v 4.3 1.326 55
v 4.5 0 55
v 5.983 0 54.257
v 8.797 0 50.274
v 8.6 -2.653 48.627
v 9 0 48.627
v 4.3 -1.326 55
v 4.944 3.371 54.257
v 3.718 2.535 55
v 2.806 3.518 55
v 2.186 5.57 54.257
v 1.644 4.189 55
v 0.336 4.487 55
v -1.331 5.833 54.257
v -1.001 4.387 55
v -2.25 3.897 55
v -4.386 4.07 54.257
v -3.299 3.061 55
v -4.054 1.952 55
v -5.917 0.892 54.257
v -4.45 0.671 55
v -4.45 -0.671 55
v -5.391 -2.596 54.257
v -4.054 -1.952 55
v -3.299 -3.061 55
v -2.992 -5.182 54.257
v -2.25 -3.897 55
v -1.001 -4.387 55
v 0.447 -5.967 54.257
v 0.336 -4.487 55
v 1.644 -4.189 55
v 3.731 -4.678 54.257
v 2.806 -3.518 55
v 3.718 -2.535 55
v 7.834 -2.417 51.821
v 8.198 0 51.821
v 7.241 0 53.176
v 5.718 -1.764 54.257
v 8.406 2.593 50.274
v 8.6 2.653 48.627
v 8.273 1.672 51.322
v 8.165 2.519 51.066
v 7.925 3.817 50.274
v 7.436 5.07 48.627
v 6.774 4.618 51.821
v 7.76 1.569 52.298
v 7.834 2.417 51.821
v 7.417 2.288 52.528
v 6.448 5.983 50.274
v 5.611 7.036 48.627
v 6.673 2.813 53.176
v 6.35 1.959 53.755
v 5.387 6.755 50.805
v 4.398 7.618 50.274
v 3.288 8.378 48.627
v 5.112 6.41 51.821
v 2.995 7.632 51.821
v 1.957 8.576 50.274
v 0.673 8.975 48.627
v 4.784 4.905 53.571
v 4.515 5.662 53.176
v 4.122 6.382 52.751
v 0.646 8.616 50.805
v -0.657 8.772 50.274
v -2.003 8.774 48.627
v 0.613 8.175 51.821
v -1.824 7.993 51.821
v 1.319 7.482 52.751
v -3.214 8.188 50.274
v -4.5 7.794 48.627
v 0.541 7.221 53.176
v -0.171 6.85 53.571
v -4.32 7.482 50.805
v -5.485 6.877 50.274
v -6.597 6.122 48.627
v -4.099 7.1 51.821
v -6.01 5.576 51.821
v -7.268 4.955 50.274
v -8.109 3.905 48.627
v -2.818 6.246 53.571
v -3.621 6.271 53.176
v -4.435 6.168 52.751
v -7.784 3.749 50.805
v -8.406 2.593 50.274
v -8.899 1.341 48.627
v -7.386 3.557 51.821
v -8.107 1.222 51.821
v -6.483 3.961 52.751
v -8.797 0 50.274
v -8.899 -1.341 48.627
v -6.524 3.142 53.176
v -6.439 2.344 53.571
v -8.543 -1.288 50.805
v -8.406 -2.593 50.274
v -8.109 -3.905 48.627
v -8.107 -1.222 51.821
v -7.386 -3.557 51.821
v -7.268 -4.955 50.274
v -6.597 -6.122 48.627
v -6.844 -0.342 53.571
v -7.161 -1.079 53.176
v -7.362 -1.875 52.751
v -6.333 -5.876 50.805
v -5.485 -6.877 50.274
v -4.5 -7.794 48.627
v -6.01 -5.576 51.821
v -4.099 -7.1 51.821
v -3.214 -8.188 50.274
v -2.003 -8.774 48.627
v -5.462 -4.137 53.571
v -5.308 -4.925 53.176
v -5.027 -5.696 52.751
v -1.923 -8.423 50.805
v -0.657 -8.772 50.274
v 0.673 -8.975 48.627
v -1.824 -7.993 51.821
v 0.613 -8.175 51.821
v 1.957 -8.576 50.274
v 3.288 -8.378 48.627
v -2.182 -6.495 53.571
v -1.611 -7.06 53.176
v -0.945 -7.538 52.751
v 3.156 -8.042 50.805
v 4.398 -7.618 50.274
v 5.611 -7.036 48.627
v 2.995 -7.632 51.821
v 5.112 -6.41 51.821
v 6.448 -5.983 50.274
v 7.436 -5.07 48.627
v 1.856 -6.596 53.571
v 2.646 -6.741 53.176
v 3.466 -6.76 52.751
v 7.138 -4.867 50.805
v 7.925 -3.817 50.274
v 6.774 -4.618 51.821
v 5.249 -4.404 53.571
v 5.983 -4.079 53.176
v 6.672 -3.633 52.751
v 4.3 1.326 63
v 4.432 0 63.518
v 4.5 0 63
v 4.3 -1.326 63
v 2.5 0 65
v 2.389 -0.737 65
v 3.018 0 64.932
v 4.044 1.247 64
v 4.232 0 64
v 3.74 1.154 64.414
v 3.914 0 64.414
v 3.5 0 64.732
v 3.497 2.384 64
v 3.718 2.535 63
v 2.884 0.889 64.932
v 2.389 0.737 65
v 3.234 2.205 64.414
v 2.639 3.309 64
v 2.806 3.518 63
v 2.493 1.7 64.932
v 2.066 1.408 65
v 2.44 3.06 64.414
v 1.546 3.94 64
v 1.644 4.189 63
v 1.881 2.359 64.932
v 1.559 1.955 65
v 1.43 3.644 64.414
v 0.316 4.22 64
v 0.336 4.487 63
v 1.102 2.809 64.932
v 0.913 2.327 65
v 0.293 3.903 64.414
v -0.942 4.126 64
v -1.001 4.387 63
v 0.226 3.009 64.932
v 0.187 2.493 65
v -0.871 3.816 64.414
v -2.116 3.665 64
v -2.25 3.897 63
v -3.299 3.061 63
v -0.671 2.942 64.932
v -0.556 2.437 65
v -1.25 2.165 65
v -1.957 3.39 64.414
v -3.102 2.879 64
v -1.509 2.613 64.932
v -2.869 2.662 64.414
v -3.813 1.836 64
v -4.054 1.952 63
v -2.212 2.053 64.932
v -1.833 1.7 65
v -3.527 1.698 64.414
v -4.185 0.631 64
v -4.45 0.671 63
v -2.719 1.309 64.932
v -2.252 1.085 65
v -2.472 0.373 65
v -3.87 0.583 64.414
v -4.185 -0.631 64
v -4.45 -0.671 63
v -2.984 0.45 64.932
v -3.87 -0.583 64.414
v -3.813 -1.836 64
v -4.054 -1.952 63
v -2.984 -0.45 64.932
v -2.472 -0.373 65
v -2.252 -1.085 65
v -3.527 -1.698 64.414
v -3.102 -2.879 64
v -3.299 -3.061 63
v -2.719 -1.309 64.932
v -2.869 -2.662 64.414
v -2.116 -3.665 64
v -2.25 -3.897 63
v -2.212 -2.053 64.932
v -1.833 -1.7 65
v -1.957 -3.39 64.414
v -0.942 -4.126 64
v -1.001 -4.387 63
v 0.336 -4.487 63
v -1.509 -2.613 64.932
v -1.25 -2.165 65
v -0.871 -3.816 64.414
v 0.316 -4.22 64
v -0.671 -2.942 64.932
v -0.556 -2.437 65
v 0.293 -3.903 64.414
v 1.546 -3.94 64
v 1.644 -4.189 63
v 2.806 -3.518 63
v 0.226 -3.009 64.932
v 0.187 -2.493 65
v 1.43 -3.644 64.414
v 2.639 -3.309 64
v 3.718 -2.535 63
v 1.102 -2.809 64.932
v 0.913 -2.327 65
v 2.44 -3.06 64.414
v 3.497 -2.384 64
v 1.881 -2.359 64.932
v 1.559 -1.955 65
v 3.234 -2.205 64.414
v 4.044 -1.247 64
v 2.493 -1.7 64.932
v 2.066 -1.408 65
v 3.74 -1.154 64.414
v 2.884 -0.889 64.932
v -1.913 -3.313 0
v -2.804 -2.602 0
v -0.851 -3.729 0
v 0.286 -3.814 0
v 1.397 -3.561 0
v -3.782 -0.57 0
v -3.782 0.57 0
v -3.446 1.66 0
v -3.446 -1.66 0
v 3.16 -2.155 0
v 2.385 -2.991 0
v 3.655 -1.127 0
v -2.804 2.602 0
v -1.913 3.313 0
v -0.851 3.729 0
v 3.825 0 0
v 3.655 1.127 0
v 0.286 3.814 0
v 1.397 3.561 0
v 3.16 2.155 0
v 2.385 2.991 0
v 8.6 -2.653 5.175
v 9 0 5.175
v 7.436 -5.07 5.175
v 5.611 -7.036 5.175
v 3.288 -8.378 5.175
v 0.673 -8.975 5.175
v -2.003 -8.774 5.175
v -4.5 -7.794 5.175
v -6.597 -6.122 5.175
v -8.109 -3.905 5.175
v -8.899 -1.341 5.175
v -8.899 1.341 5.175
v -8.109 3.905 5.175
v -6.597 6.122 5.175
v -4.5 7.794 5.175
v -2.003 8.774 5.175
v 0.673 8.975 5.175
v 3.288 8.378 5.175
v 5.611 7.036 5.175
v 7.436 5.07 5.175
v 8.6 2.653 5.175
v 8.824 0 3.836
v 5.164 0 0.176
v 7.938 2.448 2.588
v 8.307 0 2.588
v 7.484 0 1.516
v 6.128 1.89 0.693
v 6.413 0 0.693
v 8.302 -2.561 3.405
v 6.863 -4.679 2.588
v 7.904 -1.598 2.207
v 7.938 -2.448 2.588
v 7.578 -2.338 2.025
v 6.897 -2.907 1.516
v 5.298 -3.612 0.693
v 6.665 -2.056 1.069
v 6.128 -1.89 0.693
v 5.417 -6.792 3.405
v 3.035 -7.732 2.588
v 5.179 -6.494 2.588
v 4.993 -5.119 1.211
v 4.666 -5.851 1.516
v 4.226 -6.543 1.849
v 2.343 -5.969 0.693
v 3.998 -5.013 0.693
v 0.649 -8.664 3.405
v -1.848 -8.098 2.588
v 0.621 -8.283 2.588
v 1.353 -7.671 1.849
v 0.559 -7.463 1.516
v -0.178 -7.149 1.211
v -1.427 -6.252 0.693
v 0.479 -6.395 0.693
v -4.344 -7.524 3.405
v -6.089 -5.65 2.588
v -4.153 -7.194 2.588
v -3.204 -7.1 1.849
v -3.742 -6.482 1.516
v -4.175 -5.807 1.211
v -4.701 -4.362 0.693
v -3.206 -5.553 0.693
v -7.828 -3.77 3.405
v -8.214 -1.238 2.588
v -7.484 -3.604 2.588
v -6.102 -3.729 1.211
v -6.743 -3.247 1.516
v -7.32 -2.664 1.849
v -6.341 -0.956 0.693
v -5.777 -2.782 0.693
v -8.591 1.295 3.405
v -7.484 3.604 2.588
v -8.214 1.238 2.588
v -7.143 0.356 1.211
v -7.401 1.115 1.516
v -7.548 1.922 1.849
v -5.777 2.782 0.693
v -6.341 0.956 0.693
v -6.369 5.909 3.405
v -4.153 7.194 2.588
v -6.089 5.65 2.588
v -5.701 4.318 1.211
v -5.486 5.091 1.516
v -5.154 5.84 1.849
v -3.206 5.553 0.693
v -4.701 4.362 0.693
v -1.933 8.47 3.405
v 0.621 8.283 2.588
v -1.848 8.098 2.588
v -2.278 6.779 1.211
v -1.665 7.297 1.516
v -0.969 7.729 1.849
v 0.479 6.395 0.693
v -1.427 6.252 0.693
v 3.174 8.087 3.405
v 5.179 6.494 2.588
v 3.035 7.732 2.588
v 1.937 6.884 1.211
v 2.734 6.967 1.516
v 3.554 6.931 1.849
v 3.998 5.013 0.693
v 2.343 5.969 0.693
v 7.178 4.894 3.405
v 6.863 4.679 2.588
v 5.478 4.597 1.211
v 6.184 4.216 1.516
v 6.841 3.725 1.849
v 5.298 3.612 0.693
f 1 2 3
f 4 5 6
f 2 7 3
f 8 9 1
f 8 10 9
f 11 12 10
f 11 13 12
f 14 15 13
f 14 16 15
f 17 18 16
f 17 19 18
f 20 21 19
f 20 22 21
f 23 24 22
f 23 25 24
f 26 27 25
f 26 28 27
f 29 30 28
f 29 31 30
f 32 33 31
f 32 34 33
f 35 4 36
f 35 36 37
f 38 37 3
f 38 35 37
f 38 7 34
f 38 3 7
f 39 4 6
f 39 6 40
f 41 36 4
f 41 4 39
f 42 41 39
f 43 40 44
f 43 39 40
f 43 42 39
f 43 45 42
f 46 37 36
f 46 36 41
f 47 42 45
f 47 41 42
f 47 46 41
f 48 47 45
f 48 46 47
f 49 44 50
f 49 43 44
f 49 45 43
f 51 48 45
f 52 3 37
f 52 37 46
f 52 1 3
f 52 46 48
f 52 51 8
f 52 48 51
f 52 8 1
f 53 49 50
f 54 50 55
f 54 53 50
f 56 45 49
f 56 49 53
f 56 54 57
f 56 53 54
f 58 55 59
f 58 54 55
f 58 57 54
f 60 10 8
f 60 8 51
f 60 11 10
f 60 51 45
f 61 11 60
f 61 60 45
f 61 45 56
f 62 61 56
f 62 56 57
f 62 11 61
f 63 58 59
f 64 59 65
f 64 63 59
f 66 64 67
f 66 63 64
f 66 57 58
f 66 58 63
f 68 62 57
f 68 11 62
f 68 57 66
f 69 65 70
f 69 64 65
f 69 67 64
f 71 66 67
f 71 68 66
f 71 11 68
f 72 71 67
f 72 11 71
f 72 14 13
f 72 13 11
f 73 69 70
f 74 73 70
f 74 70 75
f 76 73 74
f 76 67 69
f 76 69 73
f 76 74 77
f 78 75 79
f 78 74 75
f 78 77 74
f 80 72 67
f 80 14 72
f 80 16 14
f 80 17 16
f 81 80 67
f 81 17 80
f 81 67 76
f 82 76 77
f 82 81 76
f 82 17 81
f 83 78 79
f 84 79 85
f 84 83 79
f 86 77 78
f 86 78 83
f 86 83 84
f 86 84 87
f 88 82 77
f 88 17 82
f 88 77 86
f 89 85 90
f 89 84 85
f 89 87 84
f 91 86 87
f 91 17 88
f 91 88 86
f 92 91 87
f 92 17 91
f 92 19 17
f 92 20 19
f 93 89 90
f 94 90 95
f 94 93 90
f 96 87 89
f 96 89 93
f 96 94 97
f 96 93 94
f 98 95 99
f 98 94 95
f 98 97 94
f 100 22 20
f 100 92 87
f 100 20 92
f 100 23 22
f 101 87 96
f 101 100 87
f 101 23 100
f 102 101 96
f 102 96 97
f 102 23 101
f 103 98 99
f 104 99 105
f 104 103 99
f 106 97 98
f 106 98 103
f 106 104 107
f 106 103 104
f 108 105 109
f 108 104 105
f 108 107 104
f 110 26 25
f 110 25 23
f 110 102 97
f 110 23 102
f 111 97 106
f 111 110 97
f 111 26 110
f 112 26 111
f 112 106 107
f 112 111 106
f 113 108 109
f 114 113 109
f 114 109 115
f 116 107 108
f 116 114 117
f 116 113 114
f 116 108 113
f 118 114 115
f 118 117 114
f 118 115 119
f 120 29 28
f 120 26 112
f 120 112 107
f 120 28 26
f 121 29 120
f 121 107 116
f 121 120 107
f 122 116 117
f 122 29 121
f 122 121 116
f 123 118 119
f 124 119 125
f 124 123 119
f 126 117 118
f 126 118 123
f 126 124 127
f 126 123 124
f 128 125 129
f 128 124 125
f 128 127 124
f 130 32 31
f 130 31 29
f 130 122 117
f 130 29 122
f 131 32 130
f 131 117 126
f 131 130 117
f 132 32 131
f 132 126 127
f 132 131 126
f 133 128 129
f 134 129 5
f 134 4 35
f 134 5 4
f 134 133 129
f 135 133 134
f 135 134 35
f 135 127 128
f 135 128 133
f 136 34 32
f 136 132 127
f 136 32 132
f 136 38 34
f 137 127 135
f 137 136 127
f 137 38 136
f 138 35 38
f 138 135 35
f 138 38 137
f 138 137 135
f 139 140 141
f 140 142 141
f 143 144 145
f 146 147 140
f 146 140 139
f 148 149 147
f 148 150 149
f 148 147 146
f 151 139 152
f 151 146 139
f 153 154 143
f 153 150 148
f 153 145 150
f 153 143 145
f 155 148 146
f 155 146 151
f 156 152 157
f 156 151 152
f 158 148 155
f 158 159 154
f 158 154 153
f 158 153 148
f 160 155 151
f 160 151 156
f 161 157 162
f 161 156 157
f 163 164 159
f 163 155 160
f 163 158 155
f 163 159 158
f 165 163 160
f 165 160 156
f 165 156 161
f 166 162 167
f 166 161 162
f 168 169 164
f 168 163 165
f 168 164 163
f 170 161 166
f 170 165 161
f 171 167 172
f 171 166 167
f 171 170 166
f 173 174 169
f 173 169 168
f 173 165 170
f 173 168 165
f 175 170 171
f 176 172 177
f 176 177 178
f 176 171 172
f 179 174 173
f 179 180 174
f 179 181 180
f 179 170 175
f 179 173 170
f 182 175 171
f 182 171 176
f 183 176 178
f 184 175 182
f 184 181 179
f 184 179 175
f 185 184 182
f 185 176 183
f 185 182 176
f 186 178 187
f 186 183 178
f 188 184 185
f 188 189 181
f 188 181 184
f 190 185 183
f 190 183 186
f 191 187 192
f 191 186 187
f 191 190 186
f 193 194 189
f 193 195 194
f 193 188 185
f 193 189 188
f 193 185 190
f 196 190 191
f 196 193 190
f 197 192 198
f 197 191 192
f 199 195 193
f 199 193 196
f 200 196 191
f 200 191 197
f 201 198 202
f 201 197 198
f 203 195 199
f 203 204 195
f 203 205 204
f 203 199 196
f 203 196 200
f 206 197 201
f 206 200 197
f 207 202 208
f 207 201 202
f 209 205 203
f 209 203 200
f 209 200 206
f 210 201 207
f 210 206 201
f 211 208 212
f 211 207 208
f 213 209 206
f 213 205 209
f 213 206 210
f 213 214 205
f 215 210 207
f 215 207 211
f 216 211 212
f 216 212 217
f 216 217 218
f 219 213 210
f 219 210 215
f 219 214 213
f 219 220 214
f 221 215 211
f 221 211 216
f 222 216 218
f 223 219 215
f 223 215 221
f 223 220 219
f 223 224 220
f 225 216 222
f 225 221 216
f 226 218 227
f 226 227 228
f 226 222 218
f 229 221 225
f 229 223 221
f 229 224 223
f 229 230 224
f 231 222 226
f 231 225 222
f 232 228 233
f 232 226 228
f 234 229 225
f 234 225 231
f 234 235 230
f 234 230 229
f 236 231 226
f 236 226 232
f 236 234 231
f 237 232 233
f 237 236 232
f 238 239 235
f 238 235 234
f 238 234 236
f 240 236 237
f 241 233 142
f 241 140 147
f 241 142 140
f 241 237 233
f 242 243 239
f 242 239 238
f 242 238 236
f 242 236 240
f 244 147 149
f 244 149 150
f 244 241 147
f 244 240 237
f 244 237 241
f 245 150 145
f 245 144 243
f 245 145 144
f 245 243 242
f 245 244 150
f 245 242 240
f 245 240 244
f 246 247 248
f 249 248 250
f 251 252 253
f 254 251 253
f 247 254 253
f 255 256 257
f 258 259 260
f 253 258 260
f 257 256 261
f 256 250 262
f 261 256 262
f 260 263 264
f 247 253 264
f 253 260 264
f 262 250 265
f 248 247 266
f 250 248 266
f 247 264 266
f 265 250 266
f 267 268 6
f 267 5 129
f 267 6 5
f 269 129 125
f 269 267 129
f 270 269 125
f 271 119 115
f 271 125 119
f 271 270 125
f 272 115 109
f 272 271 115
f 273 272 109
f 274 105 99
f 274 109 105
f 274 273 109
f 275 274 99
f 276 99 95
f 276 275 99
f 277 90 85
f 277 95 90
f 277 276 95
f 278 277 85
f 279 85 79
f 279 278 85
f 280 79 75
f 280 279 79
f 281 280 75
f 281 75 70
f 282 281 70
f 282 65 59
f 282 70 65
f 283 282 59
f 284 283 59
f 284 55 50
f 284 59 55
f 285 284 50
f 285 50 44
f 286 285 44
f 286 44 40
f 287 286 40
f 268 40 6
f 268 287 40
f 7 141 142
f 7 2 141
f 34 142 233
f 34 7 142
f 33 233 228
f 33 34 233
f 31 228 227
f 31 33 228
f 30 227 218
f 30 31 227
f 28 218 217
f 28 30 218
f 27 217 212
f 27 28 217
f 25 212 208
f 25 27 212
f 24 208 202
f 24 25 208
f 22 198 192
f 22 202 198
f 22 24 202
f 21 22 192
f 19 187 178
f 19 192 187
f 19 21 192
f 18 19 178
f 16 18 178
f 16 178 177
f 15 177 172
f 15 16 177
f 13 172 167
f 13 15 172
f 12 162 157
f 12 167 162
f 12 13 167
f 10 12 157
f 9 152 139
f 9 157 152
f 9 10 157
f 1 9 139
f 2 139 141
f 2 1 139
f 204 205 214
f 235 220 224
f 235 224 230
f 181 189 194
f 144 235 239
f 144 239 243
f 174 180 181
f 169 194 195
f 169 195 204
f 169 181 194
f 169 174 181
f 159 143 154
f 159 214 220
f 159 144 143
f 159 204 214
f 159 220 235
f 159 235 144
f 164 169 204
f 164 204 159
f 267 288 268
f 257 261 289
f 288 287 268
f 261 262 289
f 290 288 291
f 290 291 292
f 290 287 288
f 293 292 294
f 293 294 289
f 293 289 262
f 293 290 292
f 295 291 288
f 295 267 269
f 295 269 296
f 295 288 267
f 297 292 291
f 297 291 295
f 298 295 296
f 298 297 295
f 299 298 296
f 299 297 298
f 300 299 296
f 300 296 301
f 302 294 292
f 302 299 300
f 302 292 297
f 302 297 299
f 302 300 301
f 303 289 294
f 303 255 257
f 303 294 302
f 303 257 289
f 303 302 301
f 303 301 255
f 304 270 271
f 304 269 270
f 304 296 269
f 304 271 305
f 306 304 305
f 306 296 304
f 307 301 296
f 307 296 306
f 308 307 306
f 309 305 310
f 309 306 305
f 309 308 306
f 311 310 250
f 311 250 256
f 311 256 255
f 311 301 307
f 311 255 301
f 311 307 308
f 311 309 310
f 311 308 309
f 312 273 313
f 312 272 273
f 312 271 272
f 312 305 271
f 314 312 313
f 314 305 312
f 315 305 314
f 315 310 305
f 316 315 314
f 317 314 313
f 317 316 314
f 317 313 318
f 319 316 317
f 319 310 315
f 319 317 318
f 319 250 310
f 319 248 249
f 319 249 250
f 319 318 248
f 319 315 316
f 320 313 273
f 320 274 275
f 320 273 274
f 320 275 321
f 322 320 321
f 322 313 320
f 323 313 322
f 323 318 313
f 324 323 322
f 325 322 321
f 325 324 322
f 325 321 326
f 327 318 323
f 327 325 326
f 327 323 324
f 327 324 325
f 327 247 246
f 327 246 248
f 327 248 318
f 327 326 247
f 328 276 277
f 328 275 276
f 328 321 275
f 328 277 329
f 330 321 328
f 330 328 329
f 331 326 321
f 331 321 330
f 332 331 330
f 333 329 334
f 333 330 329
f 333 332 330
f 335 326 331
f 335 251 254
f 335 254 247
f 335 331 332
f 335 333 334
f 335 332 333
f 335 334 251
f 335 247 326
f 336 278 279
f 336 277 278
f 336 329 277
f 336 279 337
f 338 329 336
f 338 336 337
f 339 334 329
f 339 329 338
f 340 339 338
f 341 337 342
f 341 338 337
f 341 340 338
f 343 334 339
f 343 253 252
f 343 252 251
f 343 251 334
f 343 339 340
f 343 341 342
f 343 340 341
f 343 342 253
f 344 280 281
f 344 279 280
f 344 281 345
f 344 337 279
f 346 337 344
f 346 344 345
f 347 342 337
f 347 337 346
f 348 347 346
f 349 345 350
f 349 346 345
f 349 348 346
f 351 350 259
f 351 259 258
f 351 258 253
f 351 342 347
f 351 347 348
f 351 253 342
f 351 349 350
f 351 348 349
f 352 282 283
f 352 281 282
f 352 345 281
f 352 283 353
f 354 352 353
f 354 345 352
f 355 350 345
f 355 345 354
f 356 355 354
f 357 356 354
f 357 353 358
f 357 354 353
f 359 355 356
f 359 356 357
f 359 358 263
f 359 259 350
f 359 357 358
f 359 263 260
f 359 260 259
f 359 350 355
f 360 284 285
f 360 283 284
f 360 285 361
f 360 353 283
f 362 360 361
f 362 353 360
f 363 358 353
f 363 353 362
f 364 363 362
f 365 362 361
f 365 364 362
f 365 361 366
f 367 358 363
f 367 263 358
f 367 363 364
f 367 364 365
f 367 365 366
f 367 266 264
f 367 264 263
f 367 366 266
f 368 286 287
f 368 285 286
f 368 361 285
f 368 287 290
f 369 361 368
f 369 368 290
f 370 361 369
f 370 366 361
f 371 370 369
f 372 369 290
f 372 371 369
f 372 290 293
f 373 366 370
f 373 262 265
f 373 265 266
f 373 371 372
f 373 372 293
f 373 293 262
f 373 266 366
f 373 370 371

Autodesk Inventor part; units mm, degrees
ref_plane "YZ Plane" through (0, 0, 0) normal (1, 0, 0) x (0, 1, 0)
ref_plane "XZ Plane" through (0, 0, 0) normal (0, 1, 0) x (-1, 0, 0)
ref_plane "XY Plane" through (0, 0, 0) normal (0, 0, 1) x (1, 0, 0)
sketch "Sketch1" plane through (0, 0, 0) normal (0, 0, 1) x (1, 0, 0)
  circle A0 centre (0, 0) radius 9
  circle A1 centre (0, 0) radius 4.5
  dimension "d0" = 18
  dimension "d1" = 9
extrude "Extrusion1" add sketch "Sketch1" along normal blind 55 contours A0 | A1
sketch "Sketch2" plane through (0, 0, 55) normal (0, 0, 1) x (1, 0, 0)
  circle A0 centre (0, 0) radius 4.5
  dimension "d4" = 9
extrude "Extrusion2" add sketch "Sketch2" along normal blind 10
fillet "Fillet1" radius 6.7625 1 edges at (-9, 0, 55)
fillet "Fillet2" radius 2 1 edges at (-4.5, 0, 65)
fillet "Fillet3" radius 5.175 1 edges at (-9, 0, 0)
properties part number "8g_CO2_Cylinder"
